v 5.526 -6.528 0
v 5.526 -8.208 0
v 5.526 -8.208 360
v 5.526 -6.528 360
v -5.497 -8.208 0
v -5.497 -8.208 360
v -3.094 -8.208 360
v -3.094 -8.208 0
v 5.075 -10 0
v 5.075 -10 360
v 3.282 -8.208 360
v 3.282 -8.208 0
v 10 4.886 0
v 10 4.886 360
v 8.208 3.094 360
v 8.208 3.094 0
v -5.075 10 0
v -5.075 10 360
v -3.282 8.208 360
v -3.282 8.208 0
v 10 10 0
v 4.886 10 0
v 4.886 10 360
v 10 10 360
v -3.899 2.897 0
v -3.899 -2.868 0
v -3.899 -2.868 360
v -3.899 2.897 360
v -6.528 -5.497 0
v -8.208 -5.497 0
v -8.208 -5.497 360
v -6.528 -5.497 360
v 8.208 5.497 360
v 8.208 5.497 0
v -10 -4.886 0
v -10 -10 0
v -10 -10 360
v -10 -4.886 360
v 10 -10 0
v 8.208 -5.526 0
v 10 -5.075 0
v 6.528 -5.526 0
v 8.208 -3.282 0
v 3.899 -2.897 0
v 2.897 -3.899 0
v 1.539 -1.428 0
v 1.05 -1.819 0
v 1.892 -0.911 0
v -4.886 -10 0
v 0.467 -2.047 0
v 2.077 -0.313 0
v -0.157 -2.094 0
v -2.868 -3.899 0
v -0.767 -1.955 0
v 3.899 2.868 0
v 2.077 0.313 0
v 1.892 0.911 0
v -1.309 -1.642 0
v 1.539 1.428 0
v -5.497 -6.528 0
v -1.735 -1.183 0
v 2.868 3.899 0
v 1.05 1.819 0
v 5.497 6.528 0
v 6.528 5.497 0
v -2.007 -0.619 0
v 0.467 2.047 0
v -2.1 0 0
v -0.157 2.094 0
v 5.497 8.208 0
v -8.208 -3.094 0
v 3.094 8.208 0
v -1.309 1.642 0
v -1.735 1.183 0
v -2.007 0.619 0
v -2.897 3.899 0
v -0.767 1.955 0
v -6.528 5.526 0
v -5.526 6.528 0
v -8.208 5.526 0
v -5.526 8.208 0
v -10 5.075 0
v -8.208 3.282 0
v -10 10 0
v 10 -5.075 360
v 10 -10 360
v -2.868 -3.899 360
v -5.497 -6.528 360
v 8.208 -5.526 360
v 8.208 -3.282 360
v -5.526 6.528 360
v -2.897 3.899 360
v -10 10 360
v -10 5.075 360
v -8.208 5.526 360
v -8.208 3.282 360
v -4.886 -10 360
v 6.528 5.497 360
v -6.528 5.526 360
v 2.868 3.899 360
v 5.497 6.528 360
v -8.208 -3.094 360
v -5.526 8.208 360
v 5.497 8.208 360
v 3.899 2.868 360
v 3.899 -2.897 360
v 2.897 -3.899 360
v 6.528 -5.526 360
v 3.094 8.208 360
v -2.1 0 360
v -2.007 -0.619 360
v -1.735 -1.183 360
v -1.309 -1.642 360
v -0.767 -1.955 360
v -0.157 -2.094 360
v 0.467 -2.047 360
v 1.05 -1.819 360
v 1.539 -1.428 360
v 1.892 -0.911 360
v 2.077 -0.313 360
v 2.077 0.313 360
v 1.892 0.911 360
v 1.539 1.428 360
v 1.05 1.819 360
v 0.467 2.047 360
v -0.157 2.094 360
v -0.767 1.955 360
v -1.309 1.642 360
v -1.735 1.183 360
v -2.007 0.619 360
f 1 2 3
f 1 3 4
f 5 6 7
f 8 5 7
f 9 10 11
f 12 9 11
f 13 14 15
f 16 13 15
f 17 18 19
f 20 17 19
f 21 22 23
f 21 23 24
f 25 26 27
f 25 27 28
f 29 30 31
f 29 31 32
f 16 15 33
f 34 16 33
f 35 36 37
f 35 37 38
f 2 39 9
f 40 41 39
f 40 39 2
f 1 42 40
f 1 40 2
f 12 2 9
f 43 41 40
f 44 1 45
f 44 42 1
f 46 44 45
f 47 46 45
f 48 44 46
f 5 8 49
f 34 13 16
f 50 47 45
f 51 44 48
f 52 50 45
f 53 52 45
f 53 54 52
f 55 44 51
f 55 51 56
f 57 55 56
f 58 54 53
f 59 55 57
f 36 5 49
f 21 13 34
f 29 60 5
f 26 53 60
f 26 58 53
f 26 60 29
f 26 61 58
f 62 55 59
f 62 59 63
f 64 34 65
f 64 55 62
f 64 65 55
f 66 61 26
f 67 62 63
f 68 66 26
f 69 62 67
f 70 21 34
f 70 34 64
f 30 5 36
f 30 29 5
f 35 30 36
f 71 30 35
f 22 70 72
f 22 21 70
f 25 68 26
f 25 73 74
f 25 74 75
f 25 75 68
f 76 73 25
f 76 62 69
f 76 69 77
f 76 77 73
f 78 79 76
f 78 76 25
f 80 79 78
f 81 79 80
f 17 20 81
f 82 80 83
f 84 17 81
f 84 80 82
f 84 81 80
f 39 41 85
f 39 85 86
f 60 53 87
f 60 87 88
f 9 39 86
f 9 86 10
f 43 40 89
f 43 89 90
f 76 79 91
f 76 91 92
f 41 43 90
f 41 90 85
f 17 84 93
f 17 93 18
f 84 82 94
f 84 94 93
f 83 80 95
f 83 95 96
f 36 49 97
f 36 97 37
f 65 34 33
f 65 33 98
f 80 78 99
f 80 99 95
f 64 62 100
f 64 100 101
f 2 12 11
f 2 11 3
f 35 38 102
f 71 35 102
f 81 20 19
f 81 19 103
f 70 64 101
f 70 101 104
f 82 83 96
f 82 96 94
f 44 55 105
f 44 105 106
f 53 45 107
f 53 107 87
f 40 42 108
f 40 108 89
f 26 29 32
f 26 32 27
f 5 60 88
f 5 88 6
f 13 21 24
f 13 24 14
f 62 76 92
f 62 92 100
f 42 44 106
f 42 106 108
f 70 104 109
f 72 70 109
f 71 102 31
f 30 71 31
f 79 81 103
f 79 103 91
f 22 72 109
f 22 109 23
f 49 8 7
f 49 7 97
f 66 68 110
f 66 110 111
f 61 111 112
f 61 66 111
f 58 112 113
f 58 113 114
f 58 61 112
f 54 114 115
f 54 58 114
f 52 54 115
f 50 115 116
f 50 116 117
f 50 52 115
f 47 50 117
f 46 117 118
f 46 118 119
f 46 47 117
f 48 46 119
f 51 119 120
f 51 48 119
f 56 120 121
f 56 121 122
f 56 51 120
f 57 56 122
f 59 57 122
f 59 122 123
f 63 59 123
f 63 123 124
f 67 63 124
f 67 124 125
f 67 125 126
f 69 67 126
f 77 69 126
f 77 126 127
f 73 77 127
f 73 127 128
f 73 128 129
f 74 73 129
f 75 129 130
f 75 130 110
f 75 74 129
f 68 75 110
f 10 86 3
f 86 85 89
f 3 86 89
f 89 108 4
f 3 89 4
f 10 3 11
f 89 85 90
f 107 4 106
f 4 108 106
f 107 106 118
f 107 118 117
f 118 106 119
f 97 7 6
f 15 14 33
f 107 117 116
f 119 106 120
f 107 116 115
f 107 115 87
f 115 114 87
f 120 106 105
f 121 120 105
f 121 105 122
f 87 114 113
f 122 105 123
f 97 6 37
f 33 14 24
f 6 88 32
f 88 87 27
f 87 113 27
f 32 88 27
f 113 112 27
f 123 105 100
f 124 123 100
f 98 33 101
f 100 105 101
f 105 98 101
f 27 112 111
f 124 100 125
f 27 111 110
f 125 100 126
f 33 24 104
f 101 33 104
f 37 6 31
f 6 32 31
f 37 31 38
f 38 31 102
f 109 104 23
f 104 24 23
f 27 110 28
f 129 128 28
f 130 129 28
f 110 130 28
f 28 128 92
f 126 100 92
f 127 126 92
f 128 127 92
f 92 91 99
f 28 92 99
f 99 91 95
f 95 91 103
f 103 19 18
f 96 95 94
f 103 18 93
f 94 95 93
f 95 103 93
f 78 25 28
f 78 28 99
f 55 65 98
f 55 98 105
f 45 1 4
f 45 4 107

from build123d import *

# Parameters (mm, degrees)
SKETCH1_R           = 2.1
BOSS_EXTRUDE1_DEPTH = 360


with BuildPart() as part:
    # Sketch1 (on Front Plane) → Boss-Extrude1 (new body)
    with BuildSketch(Plane.XY):
        Polygon((-5.074586208, 10), (-3.28215401, 8.207567802), (-5.525872647, 8.207567802), (-5.525872647, 6.527957213), (-2.897129144, 3.89921371), (2.868055105, 3.89921371), (5.496798608, 6.527957213), (5.496798608, 8.207567802), (3.093698324, 8.207567802), (4.886130522, 10), (10, 10), (10, 4.886130522), (8.207567802, 3.093698324), (8.207567802, 5.496798608), (6.527957213, 5.496798608), (3.89921371, 2.868055105), (3.89921371, -2.897129144), (6.527957213, -5.525872647), (8.207567802, -5.525872647), (8.207567802, -3.28215401), (10, -5.074586208), (10, -10), (5.074586208, -10), (3.28215401, -8.207567802), (5.525872647, -8.207567802), (5.525872647, -6.527957213), (2.897129144, -3.89921371), (-2.868055105, -3.89921371), (-5.496798608, -6.527957213), (-5.496798608, -8.207567802), (-3.093698324, -8.207567802), (-4.886130522, -10), (-10, -10), (-10, -4.886130522), (-8.207567802, -3.093698324), (-8.207567802, -5.496798608), (-6.527957213, -5.496798608), (-3.89921371, -2.868055105), (-3.89921371, 2.897129144), (-6.527957213, 5.525872647), (-8.207567802, 5.525872647), (-8.207567802, 3.28215401), (-10, 5.074586208), (-10, 10), align=None)
        with Locations(Location((0, 0, 0), (0, 0, 180))):
            Circle(SKETCH1_R, mode=Mode.SUBTRACT)
    extrude(amount=BOSS_EXTRUDE1_DEPTH)


solid = part.part
